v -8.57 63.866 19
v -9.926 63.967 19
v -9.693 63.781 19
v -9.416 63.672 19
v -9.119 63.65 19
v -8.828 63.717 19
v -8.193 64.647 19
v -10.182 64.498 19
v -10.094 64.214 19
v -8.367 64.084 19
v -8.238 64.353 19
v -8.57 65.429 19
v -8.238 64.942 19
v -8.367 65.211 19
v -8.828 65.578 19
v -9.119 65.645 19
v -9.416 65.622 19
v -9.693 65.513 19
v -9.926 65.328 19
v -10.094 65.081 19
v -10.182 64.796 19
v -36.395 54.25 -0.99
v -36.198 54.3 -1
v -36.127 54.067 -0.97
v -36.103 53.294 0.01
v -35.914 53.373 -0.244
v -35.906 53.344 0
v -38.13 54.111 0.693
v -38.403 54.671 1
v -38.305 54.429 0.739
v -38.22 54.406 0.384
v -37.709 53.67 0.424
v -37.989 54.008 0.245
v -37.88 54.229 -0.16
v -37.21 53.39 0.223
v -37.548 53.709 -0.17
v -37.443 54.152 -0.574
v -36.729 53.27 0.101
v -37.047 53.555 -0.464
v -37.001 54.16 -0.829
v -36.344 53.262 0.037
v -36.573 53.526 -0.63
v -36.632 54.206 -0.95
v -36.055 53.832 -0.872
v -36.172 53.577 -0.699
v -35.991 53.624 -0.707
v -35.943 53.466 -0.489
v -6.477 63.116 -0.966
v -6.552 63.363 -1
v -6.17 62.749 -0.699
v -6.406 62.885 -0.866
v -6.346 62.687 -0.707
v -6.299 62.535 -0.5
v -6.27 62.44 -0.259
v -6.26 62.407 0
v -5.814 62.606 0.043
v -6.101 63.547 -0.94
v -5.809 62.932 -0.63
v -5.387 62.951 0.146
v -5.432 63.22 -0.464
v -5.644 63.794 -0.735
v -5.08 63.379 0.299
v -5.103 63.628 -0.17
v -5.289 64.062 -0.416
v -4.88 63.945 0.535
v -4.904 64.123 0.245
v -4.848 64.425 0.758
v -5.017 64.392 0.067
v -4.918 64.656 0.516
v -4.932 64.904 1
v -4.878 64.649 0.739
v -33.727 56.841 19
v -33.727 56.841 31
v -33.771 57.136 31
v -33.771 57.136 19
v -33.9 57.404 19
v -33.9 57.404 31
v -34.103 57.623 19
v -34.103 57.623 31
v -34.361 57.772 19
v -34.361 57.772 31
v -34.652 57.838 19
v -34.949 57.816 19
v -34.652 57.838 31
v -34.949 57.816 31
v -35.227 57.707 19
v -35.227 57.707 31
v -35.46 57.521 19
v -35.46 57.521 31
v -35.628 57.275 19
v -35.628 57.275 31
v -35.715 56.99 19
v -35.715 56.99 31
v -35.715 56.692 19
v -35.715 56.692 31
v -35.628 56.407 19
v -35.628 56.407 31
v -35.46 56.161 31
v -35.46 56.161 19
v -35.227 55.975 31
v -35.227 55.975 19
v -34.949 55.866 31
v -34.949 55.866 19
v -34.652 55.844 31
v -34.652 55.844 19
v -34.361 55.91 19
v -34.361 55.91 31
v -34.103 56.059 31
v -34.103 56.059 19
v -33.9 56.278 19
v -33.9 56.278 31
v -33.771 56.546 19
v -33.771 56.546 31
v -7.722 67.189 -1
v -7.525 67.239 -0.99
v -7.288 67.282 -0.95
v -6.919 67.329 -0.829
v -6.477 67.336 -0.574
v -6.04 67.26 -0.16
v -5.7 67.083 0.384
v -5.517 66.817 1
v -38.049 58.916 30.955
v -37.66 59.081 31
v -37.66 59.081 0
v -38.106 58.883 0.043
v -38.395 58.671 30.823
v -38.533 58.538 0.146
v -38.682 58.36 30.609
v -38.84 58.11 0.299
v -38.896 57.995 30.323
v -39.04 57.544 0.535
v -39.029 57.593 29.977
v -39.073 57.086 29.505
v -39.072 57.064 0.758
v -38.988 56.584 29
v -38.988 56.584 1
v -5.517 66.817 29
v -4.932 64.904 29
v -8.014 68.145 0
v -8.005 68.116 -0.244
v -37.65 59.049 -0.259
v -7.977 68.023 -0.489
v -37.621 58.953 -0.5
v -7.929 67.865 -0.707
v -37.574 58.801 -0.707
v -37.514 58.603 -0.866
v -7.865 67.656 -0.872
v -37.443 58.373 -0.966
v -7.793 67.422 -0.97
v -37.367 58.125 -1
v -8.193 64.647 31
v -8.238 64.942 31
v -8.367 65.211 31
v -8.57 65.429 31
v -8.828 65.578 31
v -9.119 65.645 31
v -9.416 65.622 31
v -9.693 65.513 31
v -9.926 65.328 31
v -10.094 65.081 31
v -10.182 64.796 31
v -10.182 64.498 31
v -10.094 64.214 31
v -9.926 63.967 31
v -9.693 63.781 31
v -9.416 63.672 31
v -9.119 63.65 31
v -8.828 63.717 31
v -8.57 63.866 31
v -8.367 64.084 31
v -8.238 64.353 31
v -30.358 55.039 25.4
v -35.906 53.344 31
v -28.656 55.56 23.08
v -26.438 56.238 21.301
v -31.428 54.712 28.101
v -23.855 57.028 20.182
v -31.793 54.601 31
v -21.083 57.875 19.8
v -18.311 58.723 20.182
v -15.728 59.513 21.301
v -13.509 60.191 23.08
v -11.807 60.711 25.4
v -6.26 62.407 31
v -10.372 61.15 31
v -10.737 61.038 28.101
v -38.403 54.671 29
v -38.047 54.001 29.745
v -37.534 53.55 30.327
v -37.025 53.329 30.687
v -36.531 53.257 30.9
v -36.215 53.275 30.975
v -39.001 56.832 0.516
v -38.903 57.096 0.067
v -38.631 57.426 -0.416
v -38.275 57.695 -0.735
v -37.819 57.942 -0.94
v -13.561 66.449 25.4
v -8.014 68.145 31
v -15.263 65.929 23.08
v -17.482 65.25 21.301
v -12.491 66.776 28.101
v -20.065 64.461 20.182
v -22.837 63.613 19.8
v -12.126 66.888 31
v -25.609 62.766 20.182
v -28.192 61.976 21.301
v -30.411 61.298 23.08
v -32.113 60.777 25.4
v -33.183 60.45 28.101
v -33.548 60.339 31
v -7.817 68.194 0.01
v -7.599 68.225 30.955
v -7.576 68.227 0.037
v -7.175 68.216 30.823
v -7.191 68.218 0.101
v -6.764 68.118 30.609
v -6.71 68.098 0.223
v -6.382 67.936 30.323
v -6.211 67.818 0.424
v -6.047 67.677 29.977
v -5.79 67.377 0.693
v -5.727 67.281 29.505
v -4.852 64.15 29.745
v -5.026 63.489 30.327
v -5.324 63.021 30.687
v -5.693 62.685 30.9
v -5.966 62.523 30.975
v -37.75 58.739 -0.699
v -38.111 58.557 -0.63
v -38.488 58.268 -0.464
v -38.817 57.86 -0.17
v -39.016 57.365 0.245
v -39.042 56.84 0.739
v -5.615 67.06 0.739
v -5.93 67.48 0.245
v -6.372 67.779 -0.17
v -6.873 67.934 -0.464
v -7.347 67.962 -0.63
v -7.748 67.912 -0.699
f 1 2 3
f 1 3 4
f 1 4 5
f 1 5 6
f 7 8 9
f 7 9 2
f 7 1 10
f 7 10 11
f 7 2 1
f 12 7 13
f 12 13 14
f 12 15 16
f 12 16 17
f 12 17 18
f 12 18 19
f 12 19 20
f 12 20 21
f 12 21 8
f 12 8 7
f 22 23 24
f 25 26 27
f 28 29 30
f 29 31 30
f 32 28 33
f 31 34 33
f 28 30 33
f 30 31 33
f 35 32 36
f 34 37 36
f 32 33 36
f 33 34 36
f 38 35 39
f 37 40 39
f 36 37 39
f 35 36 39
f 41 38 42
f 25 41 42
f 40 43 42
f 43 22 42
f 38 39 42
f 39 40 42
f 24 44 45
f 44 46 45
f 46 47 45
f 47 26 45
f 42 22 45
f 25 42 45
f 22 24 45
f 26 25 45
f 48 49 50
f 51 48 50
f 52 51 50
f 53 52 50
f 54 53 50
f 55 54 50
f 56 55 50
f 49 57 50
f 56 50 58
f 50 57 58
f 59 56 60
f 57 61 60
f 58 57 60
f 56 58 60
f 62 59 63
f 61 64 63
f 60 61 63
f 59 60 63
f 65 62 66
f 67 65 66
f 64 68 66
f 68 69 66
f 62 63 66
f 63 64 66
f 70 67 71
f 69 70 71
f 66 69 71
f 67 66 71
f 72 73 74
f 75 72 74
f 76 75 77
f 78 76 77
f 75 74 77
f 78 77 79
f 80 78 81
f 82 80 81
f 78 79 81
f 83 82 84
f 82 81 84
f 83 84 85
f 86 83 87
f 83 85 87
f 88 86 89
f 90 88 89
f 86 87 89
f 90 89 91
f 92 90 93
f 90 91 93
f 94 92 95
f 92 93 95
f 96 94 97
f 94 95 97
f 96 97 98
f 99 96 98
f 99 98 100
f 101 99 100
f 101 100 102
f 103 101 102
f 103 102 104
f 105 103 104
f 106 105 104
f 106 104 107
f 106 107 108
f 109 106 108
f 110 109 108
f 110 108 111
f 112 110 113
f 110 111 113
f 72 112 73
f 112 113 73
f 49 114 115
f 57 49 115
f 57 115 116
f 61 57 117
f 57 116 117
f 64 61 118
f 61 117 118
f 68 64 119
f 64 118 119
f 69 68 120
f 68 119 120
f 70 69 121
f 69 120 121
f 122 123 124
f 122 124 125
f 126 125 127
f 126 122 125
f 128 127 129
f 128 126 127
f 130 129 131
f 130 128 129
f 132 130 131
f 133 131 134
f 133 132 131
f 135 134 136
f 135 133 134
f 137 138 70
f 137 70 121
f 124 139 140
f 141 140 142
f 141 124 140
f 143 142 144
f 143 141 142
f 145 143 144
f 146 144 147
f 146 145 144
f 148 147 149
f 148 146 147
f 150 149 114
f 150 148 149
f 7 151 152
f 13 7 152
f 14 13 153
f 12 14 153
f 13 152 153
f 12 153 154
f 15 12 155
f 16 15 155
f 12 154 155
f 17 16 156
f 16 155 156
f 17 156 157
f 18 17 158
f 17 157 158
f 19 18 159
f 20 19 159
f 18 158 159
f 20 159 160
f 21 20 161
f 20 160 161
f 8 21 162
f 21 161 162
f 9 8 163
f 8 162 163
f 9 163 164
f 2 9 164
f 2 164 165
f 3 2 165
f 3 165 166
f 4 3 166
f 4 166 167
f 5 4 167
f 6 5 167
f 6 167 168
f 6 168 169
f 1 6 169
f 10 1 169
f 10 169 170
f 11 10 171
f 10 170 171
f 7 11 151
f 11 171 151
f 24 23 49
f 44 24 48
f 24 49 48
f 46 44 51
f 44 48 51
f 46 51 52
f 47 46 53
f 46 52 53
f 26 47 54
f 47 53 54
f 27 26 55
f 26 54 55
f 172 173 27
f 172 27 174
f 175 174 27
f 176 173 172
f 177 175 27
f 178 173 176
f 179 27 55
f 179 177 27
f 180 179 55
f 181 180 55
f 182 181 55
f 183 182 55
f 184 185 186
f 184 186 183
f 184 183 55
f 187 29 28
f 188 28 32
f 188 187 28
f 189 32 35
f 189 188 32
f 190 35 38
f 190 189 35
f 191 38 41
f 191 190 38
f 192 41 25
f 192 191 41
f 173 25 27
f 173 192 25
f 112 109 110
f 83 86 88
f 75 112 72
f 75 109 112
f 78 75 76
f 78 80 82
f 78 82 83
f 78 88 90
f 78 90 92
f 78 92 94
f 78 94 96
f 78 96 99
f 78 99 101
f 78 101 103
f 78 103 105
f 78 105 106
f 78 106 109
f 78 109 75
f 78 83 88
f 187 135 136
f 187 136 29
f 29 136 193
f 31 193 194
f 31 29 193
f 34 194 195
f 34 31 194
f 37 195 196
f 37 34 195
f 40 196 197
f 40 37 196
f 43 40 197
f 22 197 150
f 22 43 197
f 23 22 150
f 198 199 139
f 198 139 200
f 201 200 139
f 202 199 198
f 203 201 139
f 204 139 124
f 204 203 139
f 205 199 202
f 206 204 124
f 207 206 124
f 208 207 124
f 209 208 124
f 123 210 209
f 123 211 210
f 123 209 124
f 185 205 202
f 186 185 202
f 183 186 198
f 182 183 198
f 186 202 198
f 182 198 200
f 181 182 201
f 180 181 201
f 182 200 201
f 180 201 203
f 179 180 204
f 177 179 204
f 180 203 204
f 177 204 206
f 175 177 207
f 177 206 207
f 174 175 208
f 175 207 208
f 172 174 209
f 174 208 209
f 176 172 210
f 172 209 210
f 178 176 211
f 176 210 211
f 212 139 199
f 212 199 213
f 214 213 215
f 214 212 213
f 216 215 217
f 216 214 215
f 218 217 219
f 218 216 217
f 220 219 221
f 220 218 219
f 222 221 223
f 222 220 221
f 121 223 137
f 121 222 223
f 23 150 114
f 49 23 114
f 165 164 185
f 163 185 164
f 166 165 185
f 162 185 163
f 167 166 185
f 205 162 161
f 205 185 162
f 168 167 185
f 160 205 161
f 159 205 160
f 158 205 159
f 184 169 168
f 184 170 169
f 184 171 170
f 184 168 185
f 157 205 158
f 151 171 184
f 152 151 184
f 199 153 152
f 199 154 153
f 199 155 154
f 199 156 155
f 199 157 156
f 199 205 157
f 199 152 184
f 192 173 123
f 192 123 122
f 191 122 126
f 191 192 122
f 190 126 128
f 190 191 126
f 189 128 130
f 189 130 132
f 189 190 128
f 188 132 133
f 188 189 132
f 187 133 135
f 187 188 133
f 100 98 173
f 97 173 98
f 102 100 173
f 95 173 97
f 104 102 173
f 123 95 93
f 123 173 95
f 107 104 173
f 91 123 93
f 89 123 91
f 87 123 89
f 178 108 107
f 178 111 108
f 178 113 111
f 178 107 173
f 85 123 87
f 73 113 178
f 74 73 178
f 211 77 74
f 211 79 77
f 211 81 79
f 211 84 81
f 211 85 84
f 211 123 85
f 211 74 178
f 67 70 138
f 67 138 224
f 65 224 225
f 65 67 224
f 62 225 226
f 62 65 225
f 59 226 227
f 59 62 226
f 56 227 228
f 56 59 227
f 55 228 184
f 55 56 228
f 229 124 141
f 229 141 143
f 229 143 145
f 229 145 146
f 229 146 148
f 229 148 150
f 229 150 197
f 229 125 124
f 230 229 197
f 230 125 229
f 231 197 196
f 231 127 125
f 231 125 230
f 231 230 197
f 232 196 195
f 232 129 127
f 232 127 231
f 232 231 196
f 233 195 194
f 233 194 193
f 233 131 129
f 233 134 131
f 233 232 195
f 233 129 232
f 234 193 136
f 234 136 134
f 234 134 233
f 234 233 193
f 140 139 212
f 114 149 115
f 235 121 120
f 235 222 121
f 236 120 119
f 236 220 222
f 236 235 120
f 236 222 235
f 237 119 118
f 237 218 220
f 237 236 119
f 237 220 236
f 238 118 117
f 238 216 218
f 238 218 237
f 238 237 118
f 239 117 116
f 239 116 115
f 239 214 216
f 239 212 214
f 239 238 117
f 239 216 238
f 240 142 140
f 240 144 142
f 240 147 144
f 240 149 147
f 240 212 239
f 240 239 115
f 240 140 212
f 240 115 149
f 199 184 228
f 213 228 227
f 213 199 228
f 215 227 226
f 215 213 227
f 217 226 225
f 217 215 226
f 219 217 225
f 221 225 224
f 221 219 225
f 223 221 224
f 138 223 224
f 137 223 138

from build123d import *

# Parameters (mm, degrees)
PAD005_DEPTH      = 31
PAD005_DEPTH_BACK = 1
SKETCH022_R       = 11.2
POCKET006_DEPTH   = 15.7868758107
FILLET001_R       = 2
FILLET002_R       = 2
FILLET003_R       = 1
SKETCH026_R       = 1
SKETCH026_R_2     = 1.795314
SKETCH026_R_3     = 4.028245
POCKET008_DEPTH   = 12


with BuildPart() as part:
    # Sketch017 → Pad005 (new body, two sides)
    with BuildSketch(Plane.XY) as pad005_sk:
        Polygon((-6.1017054199, 68.7296820229), (-39.5723718786, 58.4966723576), (-37.8181416502, 52.7588438218), (-4.3474751915, 62.9918534871), align=None)
    extrude(amount=PAD005_DEPTH)
    extrude(pad005_sk.sketch, amount=-PAD005_DEPTH_BACK)

    # Sketch022 → Pocket006 (cut, through all)
    with BuildSketch(Plane(origin=(-19.7381564076, 64.5606005697, 0), x_dir=(-0.956304756, -0.2923717047, 0), z_dir=(-0.2923717047, 0.956304756, 0))):
        with Locations((3.2404756144, 31)):
            Circle(SKETCH022_R)
    extrude(amount=-POCKET006_DEPTH, mode=Mode.SUBTRACT)

    # Fillet001
    fillet001_edges = [part.edges().sort_by_distance(p)[0] for p in [
        (-39.572372, 58.496672, 15),
        (-37.818142, 52.758844, 15),
        (-38.695257, 55.627758, -1),
        (-38.695257, 55.627758, 31),
    ]]
    fillet(fillet001_edges, radius=FILLET001_R)

    # Fillet002
    fillet002_edges = [part.edges().sort_by_distance(p)[0] for p in [
        (-4.347475, 62.991853, 15),
        (-6.101705, 68.729682, 15),
        (-5.22459, 65.860768, -1),
        (-5.22459, 65.860768, 31),
    ]]
    fillet(fillet002_edges, radius=FILLET002_R)

    # Fillet003
    fillet003_edges = [part.edges().sort_by_distance(p)[0] for p in [
        (-22.837039, 63.613177, -1),
        (-21.082808, 57.875349, -1),
    ]]
    fillet(fillet003_edges, radius=FILLET003_R)

    # Sketch026 → Pocket008 (cut)
    with BuildSketch(Plane.XY.offset(31)):
        with Locations((-9.1932550429, 64.6474251804)):
            Circle(SKETCH026_R)
        with Locations((-34.7265920272, 56.8411006643)):
            Circle(SKETCH026_R)
        with Locations((66.962929, 24.575243)):
            Circle(SKETCH026_R_2)
        with Locations((61.462162, -12.93002)):
            Circle(SKETCH026_R_3)
    extrude(amount=-POCKET008_DEPTH, mode=Mode.SUBTRACT)


solid = part.part
